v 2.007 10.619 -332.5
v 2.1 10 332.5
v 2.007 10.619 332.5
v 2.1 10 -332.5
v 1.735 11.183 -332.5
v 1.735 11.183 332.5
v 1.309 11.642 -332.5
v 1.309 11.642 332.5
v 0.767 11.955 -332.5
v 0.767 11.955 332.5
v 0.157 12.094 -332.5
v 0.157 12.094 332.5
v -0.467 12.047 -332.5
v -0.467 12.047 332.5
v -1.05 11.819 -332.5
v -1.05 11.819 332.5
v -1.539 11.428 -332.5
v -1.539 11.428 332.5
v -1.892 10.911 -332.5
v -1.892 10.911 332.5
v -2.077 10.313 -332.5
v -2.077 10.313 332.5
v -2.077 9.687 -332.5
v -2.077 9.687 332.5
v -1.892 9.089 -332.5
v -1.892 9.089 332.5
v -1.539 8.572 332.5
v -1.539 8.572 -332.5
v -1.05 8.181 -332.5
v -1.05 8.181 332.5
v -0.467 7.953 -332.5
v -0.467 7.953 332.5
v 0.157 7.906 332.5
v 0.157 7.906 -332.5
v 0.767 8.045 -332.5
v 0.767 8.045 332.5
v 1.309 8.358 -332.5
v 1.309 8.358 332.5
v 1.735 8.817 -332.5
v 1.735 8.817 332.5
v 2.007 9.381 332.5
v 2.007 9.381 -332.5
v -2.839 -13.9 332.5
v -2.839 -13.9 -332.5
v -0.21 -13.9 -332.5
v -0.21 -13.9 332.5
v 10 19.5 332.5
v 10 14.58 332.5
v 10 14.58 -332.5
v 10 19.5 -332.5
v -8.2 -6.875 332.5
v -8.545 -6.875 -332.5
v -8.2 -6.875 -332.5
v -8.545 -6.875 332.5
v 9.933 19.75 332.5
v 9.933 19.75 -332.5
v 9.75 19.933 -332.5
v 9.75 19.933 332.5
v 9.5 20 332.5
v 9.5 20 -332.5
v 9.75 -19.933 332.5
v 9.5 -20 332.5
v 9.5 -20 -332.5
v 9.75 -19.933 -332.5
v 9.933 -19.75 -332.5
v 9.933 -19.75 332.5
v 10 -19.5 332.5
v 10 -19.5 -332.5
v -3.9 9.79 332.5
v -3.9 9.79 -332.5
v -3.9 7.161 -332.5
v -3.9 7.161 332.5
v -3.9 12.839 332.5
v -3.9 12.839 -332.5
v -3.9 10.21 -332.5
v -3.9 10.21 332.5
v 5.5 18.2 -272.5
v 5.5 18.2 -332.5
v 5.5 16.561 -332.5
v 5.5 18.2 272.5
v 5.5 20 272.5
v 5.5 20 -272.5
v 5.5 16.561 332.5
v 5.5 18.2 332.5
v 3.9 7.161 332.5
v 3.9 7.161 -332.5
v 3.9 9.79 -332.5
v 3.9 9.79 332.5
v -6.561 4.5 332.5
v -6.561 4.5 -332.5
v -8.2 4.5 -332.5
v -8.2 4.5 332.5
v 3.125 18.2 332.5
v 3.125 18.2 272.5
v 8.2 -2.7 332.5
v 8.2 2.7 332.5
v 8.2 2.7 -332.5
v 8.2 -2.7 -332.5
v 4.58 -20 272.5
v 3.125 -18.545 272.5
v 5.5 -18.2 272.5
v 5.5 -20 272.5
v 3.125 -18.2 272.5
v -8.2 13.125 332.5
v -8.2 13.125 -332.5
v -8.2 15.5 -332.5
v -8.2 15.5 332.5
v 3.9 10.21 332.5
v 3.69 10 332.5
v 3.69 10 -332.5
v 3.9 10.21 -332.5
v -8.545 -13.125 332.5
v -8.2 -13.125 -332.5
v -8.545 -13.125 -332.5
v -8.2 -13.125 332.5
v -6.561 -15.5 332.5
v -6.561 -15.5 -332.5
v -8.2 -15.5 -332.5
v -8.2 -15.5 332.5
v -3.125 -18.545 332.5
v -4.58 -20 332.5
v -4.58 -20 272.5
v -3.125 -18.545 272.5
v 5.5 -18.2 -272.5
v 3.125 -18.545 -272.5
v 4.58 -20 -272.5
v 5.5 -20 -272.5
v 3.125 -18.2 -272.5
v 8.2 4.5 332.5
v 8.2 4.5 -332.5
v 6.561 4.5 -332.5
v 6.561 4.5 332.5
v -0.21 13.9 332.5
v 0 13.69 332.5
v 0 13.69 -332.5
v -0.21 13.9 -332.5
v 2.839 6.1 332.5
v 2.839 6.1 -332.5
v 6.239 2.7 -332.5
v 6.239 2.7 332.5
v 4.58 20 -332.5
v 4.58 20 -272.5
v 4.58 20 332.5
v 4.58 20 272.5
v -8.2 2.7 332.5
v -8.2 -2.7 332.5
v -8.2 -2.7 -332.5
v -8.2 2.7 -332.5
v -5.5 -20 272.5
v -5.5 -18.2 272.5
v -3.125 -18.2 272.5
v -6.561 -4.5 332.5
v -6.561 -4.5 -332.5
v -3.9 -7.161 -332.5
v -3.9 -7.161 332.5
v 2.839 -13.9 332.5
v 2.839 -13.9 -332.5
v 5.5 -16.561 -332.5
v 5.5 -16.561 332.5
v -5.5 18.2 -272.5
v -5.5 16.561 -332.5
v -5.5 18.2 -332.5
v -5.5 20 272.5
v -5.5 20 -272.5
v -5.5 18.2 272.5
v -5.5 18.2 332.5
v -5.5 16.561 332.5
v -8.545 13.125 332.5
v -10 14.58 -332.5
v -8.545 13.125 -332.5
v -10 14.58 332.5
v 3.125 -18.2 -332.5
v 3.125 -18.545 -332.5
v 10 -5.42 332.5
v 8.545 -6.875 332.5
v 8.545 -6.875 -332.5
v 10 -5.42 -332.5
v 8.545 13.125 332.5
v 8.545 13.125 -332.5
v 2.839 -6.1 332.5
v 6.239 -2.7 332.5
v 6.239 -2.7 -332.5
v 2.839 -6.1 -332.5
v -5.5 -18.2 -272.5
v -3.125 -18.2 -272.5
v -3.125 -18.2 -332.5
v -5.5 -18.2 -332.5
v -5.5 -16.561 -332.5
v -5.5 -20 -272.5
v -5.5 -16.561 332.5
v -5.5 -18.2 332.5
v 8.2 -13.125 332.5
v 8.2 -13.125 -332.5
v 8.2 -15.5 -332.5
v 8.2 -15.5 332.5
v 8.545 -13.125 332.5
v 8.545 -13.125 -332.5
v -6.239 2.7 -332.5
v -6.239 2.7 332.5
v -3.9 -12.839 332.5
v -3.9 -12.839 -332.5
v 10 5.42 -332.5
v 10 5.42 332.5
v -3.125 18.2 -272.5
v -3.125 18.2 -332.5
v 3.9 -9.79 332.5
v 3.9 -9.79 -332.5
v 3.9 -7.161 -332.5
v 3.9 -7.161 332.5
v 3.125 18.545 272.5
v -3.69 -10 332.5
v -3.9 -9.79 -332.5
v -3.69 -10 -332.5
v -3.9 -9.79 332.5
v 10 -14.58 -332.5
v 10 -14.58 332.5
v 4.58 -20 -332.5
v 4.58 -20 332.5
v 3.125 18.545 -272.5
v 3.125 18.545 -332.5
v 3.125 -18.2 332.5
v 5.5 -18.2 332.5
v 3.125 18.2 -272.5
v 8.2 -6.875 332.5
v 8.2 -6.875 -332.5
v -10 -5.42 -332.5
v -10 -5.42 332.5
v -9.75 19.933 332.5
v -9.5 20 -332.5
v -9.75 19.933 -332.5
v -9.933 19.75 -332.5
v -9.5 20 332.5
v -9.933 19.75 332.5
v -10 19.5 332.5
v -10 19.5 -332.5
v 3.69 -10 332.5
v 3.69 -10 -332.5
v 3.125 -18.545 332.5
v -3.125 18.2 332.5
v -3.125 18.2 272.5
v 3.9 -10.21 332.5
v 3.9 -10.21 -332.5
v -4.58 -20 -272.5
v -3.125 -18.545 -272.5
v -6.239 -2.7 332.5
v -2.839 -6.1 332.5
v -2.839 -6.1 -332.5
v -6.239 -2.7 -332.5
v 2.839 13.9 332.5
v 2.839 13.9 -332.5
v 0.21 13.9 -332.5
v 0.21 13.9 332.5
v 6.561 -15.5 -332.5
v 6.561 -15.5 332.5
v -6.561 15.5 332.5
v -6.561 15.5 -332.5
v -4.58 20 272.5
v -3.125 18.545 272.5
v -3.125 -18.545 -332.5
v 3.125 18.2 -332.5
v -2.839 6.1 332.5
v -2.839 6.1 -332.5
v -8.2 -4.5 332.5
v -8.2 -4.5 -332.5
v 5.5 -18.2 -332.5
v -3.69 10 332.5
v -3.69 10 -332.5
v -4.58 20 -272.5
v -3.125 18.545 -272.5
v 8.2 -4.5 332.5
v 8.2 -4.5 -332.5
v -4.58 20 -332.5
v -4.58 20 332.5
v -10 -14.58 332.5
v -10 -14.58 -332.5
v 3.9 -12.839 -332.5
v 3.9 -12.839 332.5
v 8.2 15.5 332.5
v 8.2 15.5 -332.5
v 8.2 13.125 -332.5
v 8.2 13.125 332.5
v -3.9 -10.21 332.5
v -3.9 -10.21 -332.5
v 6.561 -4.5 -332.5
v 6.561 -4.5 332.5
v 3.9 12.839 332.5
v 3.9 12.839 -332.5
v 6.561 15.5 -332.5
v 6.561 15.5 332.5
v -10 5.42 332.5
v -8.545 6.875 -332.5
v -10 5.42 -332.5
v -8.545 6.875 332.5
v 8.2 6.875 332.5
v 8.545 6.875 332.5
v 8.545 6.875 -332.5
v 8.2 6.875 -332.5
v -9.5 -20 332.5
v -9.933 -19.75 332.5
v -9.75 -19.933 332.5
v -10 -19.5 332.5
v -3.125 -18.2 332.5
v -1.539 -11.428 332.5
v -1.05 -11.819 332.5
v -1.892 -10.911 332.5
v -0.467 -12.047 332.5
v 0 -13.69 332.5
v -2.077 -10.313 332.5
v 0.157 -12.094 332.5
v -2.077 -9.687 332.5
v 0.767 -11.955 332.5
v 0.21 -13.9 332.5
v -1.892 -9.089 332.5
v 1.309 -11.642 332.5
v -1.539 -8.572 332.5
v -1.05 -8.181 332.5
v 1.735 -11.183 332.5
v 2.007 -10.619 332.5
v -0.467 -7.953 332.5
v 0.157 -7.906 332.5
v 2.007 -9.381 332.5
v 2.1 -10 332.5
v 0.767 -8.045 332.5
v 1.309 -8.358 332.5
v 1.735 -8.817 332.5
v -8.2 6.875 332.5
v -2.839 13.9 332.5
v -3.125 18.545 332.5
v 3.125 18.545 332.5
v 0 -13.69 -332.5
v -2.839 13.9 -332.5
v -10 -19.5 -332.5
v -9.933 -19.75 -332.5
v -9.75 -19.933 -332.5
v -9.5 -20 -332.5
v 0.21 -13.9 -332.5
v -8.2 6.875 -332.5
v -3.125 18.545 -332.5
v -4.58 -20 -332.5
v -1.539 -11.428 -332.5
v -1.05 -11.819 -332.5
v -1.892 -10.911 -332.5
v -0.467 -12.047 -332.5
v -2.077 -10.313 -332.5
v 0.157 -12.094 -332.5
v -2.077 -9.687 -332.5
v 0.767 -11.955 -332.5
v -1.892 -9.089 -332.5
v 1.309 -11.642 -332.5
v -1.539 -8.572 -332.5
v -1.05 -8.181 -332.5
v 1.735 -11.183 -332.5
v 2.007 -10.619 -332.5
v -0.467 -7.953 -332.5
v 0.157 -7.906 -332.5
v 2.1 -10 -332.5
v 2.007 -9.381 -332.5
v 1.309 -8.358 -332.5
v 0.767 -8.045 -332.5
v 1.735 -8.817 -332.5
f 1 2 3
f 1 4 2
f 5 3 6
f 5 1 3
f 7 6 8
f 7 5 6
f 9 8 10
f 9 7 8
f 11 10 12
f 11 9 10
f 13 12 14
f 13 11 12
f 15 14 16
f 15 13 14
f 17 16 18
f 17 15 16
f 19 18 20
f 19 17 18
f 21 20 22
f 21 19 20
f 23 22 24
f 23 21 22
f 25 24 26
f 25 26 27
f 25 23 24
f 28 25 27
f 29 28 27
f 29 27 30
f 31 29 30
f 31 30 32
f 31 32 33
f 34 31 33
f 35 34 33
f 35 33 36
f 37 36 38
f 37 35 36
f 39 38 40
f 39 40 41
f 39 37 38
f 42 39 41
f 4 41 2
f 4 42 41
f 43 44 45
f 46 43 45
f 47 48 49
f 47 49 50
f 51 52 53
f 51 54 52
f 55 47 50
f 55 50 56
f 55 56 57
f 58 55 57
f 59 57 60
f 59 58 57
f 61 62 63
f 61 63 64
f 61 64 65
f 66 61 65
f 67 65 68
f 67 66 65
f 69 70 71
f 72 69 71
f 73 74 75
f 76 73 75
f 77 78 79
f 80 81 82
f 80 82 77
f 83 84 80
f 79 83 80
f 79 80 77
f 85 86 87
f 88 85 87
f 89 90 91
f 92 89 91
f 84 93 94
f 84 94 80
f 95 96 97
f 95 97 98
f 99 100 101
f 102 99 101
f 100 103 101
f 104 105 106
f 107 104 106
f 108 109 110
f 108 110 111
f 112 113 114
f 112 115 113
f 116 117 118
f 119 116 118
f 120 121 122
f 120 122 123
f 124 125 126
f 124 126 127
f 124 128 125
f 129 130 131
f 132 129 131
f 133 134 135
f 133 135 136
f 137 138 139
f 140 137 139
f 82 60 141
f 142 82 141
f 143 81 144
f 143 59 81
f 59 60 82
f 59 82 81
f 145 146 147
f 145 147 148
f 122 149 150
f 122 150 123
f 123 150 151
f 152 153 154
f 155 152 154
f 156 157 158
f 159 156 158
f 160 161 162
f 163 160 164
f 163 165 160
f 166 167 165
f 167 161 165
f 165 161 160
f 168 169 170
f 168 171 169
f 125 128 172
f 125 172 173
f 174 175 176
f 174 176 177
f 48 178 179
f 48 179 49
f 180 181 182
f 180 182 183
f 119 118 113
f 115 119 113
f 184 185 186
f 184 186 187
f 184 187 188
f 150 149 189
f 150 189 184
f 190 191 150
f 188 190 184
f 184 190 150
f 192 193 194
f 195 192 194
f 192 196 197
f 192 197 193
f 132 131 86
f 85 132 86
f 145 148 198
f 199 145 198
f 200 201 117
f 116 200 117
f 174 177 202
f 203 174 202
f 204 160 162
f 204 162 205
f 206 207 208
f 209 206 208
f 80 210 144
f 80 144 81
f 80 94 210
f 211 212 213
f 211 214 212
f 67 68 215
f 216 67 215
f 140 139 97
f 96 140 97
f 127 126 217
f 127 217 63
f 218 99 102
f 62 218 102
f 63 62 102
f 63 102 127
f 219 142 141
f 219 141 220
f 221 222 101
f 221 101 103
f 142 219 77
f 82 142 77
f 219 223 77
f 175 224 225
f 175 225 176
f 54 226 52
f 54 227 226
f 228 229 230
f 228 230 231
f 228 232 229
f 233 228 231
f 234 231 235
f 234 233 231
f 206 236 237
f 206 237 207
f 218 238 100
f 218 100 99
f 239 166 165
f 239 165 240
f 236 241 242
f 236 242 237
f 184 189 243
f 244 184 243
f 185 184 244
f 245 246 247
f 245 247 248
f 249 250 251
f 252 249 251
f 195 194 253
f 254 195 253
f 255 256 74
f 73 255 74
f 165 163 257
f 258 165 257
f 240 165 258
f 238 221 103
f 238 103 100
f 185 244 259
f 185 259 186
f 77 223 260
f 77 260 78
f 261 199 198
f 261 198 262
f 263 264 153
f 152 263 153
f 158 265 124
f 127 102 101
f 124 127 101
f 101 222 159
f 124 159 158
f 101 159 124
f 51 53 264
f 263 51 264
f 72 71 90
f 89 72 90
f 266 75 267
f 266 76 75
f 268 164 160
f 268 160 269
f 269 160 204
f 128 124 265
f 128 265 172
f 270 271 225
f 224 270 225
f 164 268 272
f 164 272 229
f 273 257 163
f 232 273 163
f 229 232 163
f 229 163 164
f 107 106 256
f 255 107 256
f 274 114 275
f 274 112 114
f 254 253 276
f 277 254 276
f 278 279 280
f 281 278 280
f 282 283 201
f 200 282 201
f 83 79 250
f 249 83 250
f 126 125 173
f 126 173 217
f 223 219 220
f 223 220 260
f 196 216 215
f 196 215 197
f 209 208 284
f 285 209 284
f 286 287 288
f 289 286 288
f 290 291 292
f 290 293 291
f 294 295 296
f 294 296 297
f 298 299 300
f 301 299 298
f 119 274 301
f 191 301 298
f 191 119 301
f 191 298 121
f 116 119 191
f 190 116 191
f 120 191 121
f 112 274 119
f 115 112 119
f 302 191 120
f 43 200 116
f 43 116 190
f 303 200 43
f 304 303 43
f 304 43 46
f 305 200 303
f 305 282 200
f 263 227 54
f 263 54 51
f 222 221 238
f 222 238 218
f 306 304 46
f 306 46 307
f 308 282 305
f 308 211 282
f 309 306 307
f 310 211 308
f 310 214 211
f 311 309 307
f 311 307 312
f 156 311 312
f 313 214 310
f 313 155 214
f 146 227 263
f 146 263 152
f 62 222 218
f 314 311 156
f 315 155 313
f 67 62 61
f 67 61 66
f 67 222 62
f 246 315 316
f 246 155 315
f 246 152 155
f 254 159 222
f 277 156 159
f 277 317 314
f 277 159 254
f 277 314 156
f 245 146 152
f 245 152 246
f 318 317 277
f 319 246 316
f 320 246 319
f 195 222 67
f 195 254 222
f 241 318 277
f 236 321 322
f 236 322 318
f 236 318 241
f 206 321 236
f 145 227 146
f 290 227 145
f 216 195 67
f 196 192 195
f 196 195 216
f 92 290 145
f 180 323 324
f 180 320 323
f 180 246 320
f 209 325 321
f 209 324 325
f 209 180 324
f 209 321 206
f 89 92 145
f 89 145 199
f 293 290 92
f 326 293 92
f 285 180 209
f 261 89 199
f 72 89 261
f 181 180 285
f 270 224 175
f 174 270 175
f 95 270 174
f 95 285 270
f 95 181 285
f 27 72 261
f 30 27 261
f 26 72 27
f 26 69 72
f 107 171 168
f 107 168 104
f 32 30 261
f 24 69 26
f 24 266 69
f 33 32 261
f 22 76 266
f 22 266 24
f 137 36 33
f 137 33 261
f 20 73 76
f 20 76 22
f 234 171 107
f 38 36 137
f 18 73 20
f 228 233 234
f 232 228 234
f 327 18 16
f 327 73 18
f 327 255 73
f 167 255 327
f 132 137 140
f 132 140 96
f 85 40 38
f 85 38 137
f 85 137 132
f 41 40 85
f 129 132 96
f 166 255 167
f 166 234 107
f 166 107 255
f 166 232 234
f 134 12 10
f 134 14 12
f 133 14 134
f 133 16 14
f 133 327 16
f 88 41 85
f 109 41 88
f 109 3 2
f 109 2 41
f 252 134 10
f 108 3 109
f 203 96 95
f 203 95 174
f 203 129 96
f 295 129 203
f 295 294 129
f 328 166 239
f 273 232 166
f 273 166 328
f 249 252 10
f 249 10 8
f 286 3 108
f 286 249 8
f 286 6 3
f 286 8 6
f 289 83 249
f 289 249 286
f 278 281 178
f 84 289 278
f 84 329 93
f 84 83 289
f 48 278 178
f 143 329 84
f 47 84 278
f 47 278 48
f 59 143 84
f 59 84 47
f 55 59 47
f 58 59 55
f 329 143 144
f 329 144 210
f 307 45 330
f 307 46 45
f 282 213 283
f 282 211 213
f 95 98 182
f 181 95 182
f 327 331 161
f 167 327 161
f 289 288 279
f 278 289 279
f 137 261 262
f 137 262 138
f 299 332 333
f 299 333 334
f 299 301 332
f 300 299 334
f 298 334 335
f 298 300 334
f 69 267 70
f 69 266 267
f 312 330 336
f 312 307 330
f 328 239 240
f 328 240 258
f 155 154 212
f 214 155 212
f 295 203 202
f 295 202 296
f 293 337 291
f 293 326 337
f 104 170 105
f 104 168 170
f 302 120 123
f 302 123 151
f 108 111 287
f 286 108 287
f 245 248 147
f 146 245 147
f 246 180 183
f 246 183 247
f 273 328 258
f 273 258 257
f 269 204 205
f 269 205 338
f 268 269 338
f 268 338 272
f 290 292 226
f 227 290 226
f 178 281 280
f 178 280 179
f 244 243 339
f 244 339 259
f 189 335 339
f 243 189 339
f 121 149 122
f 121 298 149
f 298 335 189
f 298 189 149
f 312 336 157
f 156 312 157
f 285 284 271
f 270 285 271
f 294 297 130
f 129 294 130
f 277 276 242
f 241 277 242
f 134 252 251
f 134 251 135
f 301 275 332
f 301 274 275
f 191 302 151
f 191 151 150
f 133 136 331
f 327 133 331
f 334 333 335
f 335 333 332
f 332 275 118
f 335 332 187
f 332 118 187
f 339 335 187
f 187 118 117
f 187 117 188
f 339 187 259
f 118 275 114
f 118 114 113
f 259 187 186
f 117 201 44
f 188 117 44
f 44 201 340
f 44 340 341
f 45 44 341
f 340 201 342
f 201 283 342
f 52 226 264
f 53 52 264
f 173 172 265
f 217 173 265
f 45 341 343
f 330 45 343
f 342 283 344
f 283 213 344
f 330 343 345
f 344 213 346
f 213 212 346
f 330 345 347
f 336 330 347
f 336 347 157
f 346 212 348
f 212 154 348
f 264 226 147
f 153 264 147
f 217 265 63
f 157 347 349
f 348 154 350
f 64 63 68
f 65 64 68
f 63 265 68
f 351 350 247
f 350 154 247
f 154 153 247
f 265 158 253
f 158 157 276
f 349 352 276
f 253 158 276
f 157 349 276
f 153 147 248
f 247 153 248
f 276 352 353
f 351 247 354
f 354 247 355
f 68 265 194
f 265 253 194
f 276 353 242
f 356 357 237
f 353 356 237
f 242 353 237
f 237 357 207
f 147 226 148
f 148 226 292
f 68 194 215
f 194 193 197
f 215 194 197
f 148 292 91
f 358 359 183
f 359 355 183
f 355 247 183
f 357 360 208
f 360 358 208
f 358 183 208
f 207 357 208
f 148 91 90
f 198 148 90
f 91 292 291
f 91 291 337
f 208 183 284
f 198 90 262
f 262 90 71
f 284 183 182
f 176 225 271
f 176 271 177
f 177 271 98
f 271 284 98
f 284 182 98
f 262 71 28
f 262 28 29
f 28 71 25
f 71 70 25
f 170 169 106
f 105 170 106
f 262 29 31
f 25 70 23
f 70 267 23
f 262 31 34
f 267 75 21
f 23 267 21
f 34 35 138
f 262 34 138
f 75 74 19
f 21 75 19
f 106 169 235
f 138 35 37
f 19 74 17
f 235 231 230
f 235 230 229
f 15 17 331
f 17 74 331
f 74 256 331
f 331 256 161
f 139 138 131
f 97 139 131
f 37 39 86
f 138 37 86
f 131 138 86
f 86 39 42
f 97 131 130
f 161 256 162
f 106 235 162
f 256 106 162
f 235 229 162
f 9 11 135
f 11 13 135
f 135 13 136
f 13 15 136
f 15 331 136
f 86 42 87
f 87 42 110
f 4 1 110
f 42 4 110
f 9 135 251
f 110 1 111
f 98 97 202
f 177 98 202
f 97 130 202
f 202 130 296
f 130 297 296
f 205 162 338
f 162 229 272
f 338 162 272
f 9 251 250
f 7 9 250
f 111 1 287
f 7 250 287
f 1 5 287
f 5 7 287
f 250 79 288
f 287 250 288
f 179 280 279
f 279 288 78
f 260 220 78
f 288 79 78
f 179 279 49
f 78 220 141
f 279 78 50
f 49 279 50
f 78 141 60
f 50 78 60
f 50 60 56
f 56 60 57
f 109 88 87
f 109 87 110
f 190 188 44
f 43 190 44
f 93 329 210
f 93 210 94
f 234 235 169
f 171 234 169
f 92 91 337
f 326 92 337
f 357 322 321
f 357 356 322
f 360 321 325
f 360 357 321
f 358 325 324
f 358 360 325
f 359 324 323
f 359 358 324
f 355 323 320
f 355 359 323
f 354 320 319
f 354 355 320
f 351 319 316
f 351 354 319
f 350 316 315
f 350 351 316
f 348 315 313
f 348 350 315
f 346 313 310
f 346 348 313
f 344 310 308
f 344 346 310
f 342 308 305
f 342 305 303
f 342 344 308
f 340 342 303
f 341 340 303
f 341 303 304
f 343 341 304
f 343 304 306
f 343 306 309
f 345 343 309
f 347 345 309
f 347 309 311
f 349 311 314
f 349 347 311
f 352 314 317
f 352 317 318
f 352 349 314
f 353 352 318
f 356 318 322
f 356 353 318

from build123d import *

# Parameters (mm, degrees)
SKETCH1_R           = 2.1
BOSS_EXTRUDE1_DEPTH = 332.5
SKETCH2_W           = 11
SKETCH2_H           = 1.8
CUT_EXTRUDE1_DEPTH  = 272.5


with BuildPart() as part:
    # Sketch1 → Boss-Extrude1 (new, symmetric)
    with BuildSketch(Plane.XY):
        with BuildLine():
            Line((4.58, -20), (9.5, -20))
            ThreePointArc((9.5, -20), (9.853553391, -19.853553391), (10, -19.5))
            Line((10, -19.5), (10, -14.58))
            Line((10, -14.58), (8.545, -13.125))
            Line((8.545, -13.125), (8.2, -13.125))
            Line((8.2, -13.125), (8.2, -15.5))
            Line((8.2, -15.5), (6.560660172, -15.5))
            Line((6.560660172, -15.5), (3.9, -12.839339828))
            Line((3.9, -12.839339828), (3.9, -10.21))
            Line((3.9, -10.21), (3.69, -10))
            Line((3.69, -10), (3.9, -9.79))
            Line((3.9, -9.79), (3.9, -7.160660172))
            Line((3.9, -7.160660172), (6.560660172, -4.5))
            Line((6.560660172, -4.5), (8.2, -4.5))
            Line((8.2, -4.5), (8.2, -6.875))
            Line((8.2, -6.875), (8.545, -6.875))
            Line((8.545, -6.875), (10, -5.42))
            Line((10, -5.42), (10, 5.42))
            Line((10, 5.42), (8.545, 6.875))
            Line((8.545, 6.875), (8.2, 6.875))
            Line((8.2, 6.875), (8.2, 4.5))
            Line((8.2, 4.5), (6.560660172, 4.5))
            Line((6.560660172, 4.5), (3.9, 7.160660172))
            Line((3.9, 7.160660172), (3.9, 9.79))
            Line((3.9, 9.79), (3.69, 10))
            Line((3.69, 10), (3.9, 10.21))
            Line((3.9, 10.21), (3.9, 12.839339828))
            Line((3.9, 12.839339828), (6.560660172, 15.5))
            Line((6.560660172, 15.5), (8.2, 15.5))
            Line((8.2, 15.5), (8.2, 13.125))
            Line((8.2, 13.125), (8.545, 13.125))
            Line((8.545, 13.125), (10, 14.58))
            Line((10, 14.58), (10, 19.5))
            ThreePointArc((10, 19.5), (9.853553391, 19.853553391), (9.5, 20))
            Line((9.5, 20), (4.58, 20))
            Line((4.58, 20), (3.125, 18.545))
            Line((3.125, 18.545), (3.125, 18.2))
            Line((3.125, 18.2), (5.5, 18.2))
            Line((5.5, 18.2), (5.5, 16.560660172))
            Line((5.5, 16.560660172), (2.839339828, 13.9))
            Line((2.839339828, 13.9), (0.21, 13.9))
            Line((0.21, 13.9), (0, 13.69))
            Line((0, 13.69), (-0.21, 13.9))
            Line((-0.21, 13.9), (-2.839339828, 13.9))
            Line((-2.839339828, 13.9), (-5.5, 16.560660172))
            Line((-5.5, 16.560660172), (-5.5, 18.2))
            Line((-5.5, 18.2), (-3.125, 18.2))
            Line((-3.125, 18.2), (-3.125, 18.545))
            Line((-3.125, 18.545), (-4.58, 20))
            Line((-4.58, 20), (-9.5, 20))
            ThreePointArc((-9.5, 20), (-9.853553391, 19.853553391), (-10, 19.5))
            Line((-10, 19.5), (-10, 14.58))
            Line((-10, 14.58), (-8.545, 13.125))
            Line((-8.545, 13.125), (-8.2, 13.125))
            Line((-8.2, 13.125), (-8.2, 15.5))
            Line((-8.2, 15.5), (-6.560660172, 15.5))
            Line((-6.560660172, 15.5), (-3.9, 12.839339828))
            Line((-3.9, 12.839339828), (-3.9, 10.21))
            Line((-3.9, 10.21), (-3.69, 10))
            Line((-3.69, 10), (-3.9, 9.79))
            Line((-3.9, 9.79), (-3.9, 7.160660172))
            Line((-3.9, 7.160660172), (-6.560660172, 4.5))
            Line((-6.560660172, 4.5), (-8.2, 4.5))
            Line((-8.2, 4.5), (-8.2, 6.875))
            Line((-8.2, 6.875), (-8.545, 6.875))
            Line((-8.545, 6.875), (-10, 5.42))
            Line((-10, 5.42), (-10, -5.42))
            Line((-10, -5.42), (-8.545, -6.875))
            Line((-8.545, -6.875), (-8.2, -6.875))
            Line((-8.2, -6.875), (-8.2, -4.5))
            Line((-8.2, -4.5), (-6.560660172, -4.5))
            Line((-6.560660172, -4.5), (-3.9, -7.160660172))
            Line((-3.9, -7.160660172), (-3.9, -9.79))
            Line((-3.9, -9.79), (-3.69, -10))
            Line((-3.69, -10), (-3.9, -10.21))
            Line((-3.9, -10.21), (-3.9, -12.839339828))
            Line((-3.9, -12.839339828), (-6.560660172, -15.5))
            Line((-6.560660172, -15.5), (-8.2, -15.5))
            Line((-8.2, -15.5), (-8.2, -13.125))
            Line((-8.2, -13.125), (-8.545, -13.125))
            Line((-8.545, -13.125), (-10, -14.58))
            Line((-10, -14.58), (-10, -19.5))
            ThreePointArc((-10, -19.5), (-9.853553391, -19.853553391), (-9.5, -20))
            Line((-9.5, -20), (-4.58, -20))
            Line((-4.58, -20), (-3.125, -18.545))
            Line((-3.125, -18.545), (-3.125, -18.2))
            Line((-3.125, -18.2), (-5.5, -18.2))
            Line((-5.5, -18.2), (-5.5, -16.560660172))
            Line((-5.5, -16.560660172), (-2.839339828, -13.9))
            Line((-2.839339828, -13.9), (-0.21, -13.9))
            Line((-0.21, -13.9), (0, -13.69))
            Line((0, -13.69), (0.21, -13.9))
            Line((0.21, -13.9), (2.839339828, -13.9))
            Line((2.839339828, -13.9), (5.5, -16.560660172))
            Line((5.5, -16.560660172), (5.5, -18.2))
            Line((5.5, -18.2), (3.125, -18.2))
            Line((3.125, -18.2), (3.125, -18.545))
            Line((3.125, -18.545), (4.58, -20))
        make_face()
        with Locations((0, -10)):
            Circle(SKETCH1_R, mode=Mode.SUBTRACT)
        Polygon((-6.239339828, -2.7), (-8.2, -2.7), (-8.2, 2.7), (-6.239339828, 2.7), (-2.839339828, 6.1), (2.839339828, 6.1), (6.239339828, 2.7), (8.2, 2.7), (8.2, -2.7), (6.239339828, -2.7), (2.839339828, -6.1), (-2.839339828, -6.1), align=None, mode=Mode.SUBTRACT)
        with Locations((0, 10)):
            Circle(SKETCH1_R, mode=Mode.SUBTRACT)
    extrude(amount=BOSS_EXTRUDE1_DEPTH, both=True)

    # Sketch2 → Cut-Extrude1 (cut, symmetric)
    with BuildSketch(Plane.XY):
        with Locations((0, -19.1)):
            Rectangle(SKETCH2_W, SKETCH2_H)
    cut_extrude1 = extrude(amount=CUT_EXTRUDE1_DEPTH, both=True, mode=Mode.SUBTRACT)

    # Mirror1: Cut-Extrude1 across plane
    add(cut_extrude1.mirror(Plane.ZX), mode=Mode.SUBTRACT)


solid = part.part
